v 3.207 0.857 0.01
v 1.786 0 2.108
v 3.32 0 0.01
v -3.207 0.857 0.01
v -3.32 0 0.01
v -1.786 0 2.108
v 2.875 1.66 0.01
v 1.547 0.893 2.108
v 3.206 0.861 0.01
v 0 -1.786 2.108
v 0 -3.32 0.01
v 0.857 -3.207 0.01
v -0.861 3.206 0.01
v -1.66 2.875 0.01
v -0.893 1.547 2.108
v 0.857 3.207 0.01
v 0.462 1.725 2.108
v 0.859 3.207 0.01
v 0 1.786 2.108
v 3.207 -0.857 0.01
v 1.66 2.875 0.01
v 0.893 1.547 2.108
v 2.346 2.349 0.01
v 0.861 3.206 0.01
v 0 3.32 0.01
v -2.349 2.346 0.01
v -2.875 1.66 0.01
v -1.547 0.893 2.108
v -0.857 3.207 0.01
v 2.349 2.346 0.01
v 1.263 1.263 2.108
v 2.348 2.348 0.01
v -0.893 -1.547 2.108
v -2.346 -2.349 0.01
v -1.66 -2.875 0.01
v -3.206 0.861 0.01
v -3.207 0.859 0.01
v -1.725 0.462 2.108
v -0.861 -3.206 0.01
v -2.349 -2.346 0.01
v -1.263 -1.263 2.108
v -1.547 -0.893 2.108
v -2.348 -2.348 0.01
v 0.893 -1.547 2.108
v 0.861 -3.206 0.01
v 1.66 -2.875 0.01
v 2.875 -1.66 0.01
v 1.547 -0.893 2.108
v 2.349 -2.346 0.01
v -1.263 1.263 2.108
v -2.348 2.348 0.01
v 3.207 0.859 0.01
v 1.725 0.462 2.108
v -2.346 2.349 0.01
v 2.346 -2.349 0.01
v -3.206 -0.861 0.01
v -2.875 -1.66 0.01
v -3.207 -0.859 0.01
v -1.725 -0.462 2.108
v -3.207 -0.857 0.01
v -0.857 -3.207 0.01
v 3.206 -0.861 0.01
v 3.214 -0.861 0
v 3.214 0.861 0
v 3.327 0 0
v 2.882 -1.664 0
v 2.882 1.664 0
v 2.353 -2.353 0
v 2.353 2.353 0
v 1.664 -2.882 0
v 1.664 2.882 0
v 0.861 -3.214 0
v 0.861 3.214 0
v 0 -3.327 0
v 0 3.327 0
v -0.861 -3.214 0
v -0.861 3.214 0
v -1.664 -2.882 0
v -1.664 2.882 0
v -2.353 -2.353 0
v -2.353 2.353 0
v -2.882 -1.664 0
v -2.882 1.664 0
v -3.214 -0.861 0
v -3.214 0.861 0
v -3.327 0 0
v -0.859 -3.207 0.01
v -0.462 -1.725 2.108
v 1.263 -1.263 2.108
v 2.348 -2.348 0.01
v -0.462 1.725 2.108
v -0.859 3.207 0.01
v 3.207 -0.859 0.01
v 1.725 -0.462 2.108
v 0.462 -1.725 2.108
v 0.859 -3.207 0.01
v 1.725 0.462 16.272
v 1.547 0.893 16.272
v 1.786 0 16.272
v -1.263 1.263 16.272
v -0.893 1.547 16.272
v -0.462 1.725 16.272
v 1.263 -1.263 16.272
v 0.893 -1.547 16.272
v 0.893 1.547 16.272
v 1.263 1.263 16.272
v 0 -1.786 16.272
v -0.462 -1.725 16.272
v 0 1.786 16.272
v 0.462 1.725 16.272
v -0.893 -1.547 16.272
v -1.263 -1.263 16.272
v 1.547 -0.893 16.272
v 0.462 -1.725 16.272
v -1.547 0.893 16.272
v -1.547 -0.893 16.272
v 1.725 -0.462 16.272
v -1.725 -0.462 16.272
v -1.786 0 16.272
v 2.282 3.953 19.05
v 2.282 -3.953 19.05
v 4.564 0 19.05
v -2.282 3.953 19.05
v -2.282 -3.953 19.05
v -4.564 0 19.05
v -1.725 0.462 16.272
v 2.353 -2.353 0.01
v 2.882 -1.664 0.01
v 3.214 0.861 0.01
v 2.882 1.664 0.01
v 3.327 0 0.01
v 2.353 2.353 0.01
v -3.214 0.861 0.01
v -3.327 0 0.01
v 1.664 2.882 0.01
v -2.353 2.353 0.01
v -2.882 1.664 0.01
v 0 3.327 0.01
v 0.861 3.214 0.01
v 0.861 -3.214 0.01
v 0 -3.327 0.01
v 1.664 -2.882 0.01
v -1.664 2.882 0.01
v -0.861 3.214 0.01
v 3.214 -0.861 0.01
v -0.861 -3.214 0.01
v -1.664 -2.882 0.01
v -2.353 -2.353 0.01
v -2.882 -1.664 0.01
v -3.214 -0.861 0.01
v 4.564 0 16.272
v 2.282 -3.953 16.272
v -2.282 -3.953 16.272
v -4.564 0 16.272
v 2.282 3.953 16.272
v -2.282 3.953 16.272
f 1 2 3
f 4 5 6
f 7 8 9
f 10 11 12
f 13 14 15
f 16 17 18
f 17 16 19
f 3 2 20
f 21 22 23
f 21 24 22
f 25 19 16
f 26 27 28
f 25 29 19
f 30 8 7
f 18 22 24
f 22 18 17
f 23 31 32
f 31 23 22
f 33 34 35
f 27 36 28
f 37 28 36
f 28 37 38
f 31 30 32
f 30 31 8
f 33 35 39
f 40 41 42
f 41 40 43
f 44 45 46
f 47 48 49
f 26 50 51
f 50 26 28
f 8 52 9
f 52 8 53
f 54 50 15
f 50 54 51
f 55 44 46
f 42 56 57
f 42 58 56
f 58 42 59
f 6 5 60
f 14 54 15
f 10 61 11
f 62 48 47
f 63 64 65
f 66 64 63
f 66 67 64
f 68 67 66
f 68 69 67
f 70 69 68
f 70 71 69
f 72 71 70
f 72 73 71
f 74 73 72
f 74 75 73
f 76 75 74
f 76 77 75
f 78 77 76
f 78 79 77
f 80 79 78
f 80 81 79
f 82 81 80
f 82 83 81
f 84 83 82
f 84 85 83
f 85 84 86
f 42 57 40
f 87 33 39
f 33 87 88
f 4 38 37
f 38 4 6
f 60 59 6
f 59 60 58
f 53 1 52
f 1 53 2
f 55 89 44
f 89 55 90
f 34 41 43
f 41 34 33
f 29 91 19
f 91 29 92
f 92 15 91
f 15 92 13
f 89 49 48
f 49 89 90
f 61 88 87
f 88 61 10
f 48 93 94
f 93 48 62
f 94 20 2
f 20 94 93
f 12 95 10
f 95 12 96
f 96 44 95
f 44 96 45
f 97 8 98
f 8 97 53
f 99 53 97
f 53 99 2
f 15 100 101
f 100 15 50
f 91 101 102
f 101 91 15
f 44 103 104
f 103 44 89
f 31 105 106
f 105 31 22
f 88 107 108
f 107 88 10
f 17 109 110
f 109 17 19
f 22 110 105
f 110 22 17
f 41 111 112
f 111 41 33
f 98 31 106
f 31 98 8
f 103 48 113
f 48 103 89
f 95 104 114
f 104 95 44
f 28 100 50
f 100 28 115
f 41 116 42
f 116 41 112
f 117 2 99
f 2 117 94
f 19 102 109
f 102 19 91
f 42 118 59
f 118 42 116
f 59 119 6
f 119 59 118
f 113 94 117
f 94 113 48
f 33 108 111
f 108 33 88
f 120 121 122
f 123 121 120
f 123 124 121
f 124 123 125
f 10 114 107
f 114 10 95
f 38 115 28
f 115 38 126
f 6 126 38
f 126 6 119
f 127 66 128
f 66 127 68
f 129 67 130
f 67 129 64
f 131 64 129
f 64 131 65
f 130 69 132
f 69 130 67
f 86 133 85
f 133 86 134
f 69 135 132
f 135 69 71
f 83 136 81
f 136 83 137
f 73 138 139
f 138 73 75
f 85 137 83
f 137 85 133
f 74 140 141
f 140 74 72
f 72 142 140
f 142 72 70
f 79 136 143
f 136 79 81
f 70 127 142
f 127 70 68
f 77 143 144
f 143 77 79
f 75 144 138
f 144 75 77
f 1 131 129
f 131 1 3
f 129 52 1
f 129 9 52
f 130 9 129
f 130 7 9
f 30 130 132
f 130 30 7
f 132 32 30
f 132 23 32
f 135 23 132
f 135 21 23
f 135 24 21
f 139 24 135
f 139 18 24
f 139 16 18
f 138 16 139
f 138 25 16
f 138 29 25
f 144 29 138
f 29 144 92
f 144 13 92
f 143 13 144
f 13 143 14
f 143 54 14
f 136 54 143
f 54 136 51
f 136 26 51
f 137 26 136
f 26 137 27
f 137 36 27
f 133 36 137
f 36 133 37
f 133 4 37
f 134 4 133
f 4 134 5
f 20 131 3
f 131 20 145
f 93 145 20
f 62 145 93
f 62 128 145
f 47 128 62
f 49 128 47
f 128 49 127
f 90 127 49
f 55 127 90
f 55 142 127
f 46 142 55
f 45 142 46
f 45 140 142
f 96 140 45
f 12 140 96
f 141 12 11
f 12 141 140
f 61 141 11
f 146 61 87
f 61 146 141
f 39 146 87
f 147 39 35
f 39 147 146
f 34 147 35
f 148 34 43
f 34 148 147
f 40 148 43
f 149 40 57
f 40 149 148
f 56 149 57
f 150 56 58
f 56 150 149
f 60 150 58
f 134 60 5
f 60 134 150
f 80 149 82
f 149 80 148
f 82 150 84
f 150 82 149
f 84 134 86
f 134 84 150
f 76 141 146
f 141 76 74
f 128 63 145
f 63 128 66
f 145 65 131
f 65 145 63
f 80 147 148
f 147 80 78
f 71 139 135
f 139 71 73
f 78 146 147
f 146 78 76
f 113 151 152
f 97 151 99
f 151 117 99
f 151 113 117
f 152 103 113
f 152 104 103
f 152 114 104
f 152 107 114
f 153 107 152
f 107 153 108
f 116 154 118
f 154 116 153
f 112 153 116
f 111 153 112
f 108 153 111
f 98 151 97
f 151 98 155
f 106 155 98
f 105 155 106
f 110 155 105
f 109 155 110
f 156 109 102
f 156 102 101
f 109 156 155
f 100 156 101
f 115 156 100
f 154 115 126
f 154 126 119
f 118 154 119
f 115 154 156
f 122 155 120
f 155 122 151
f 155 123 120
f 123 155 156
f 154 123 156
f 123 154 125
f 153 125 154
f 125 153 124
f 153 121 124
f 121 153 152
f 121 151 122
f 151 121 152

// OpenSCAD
// A small module defining some #6 hardware shapes
// Use solid=true to get the ouerall size of a cutout
// Use tol = .1 (or similar) to allow for printer inaccuracy
// 
IN_TO_MM = 25.4;

screw_and_nut(3/4 * IN_TO_MM, tol=0.0);
//hex_nut6_slot(10);

diameter6      = IN_TO_MM * 9 / 64;
nut6_outer_dia = IN_TO_MM * 23 / 64;
nut6_thickness = IN_TO_MM * 7 / 64;
head_height6 = IN_TO_MM * 0.083;
head_dia6    = IN_TO_MM * 0.262;


module screw_and_nut(length, tol=0.0) {
    translate ([0, 0, length-(nut6_thickness+tol)]) 
        hex_nut6(tol=tol, solid=false);
    machine_screw6(length, tol=tol);
}

    
module hex_nut6(tol = 0, solid = false) {
    linear_extrude (nut6_thickness+tol) {
        difference () {
            circle(tol + nut6_outer_dia/2, $fn = 6);
            if (!solid)
                circle(diameter6/2, $fn = 24);
        }

    }
}


module machine_screw6(length, tol=0)
{
    union() {
        translate([0, 0, tol]) {
            cylinder(head_height6, tol+head_dia6/2, tol+diameter6/2, $fn=24);
            cylinder(length-tol, tol+diameter6/2, tol+diameter6/2, $fn=24);
        }
        cylinder(tol+.01, tol+head_dia6/2, tol+head_dia6/2, $fn=24);
        //translate([0,0,-3])
        //    cylinder(3, tol+head_dia6/2, tol+head_dia6/2, $fn=24);
    }
}


module hex_nut6_slot(length, tol = 0) {
    linear_extrude (nut6_thickness+tol) {
        circle(tol + nut6_outer_dia/2, $fn = 6);
        translate([-(tol + nut6_outer_dia/2), 0, 0])
            square([tol + nut6_outer_dia, length]);
    }
}
